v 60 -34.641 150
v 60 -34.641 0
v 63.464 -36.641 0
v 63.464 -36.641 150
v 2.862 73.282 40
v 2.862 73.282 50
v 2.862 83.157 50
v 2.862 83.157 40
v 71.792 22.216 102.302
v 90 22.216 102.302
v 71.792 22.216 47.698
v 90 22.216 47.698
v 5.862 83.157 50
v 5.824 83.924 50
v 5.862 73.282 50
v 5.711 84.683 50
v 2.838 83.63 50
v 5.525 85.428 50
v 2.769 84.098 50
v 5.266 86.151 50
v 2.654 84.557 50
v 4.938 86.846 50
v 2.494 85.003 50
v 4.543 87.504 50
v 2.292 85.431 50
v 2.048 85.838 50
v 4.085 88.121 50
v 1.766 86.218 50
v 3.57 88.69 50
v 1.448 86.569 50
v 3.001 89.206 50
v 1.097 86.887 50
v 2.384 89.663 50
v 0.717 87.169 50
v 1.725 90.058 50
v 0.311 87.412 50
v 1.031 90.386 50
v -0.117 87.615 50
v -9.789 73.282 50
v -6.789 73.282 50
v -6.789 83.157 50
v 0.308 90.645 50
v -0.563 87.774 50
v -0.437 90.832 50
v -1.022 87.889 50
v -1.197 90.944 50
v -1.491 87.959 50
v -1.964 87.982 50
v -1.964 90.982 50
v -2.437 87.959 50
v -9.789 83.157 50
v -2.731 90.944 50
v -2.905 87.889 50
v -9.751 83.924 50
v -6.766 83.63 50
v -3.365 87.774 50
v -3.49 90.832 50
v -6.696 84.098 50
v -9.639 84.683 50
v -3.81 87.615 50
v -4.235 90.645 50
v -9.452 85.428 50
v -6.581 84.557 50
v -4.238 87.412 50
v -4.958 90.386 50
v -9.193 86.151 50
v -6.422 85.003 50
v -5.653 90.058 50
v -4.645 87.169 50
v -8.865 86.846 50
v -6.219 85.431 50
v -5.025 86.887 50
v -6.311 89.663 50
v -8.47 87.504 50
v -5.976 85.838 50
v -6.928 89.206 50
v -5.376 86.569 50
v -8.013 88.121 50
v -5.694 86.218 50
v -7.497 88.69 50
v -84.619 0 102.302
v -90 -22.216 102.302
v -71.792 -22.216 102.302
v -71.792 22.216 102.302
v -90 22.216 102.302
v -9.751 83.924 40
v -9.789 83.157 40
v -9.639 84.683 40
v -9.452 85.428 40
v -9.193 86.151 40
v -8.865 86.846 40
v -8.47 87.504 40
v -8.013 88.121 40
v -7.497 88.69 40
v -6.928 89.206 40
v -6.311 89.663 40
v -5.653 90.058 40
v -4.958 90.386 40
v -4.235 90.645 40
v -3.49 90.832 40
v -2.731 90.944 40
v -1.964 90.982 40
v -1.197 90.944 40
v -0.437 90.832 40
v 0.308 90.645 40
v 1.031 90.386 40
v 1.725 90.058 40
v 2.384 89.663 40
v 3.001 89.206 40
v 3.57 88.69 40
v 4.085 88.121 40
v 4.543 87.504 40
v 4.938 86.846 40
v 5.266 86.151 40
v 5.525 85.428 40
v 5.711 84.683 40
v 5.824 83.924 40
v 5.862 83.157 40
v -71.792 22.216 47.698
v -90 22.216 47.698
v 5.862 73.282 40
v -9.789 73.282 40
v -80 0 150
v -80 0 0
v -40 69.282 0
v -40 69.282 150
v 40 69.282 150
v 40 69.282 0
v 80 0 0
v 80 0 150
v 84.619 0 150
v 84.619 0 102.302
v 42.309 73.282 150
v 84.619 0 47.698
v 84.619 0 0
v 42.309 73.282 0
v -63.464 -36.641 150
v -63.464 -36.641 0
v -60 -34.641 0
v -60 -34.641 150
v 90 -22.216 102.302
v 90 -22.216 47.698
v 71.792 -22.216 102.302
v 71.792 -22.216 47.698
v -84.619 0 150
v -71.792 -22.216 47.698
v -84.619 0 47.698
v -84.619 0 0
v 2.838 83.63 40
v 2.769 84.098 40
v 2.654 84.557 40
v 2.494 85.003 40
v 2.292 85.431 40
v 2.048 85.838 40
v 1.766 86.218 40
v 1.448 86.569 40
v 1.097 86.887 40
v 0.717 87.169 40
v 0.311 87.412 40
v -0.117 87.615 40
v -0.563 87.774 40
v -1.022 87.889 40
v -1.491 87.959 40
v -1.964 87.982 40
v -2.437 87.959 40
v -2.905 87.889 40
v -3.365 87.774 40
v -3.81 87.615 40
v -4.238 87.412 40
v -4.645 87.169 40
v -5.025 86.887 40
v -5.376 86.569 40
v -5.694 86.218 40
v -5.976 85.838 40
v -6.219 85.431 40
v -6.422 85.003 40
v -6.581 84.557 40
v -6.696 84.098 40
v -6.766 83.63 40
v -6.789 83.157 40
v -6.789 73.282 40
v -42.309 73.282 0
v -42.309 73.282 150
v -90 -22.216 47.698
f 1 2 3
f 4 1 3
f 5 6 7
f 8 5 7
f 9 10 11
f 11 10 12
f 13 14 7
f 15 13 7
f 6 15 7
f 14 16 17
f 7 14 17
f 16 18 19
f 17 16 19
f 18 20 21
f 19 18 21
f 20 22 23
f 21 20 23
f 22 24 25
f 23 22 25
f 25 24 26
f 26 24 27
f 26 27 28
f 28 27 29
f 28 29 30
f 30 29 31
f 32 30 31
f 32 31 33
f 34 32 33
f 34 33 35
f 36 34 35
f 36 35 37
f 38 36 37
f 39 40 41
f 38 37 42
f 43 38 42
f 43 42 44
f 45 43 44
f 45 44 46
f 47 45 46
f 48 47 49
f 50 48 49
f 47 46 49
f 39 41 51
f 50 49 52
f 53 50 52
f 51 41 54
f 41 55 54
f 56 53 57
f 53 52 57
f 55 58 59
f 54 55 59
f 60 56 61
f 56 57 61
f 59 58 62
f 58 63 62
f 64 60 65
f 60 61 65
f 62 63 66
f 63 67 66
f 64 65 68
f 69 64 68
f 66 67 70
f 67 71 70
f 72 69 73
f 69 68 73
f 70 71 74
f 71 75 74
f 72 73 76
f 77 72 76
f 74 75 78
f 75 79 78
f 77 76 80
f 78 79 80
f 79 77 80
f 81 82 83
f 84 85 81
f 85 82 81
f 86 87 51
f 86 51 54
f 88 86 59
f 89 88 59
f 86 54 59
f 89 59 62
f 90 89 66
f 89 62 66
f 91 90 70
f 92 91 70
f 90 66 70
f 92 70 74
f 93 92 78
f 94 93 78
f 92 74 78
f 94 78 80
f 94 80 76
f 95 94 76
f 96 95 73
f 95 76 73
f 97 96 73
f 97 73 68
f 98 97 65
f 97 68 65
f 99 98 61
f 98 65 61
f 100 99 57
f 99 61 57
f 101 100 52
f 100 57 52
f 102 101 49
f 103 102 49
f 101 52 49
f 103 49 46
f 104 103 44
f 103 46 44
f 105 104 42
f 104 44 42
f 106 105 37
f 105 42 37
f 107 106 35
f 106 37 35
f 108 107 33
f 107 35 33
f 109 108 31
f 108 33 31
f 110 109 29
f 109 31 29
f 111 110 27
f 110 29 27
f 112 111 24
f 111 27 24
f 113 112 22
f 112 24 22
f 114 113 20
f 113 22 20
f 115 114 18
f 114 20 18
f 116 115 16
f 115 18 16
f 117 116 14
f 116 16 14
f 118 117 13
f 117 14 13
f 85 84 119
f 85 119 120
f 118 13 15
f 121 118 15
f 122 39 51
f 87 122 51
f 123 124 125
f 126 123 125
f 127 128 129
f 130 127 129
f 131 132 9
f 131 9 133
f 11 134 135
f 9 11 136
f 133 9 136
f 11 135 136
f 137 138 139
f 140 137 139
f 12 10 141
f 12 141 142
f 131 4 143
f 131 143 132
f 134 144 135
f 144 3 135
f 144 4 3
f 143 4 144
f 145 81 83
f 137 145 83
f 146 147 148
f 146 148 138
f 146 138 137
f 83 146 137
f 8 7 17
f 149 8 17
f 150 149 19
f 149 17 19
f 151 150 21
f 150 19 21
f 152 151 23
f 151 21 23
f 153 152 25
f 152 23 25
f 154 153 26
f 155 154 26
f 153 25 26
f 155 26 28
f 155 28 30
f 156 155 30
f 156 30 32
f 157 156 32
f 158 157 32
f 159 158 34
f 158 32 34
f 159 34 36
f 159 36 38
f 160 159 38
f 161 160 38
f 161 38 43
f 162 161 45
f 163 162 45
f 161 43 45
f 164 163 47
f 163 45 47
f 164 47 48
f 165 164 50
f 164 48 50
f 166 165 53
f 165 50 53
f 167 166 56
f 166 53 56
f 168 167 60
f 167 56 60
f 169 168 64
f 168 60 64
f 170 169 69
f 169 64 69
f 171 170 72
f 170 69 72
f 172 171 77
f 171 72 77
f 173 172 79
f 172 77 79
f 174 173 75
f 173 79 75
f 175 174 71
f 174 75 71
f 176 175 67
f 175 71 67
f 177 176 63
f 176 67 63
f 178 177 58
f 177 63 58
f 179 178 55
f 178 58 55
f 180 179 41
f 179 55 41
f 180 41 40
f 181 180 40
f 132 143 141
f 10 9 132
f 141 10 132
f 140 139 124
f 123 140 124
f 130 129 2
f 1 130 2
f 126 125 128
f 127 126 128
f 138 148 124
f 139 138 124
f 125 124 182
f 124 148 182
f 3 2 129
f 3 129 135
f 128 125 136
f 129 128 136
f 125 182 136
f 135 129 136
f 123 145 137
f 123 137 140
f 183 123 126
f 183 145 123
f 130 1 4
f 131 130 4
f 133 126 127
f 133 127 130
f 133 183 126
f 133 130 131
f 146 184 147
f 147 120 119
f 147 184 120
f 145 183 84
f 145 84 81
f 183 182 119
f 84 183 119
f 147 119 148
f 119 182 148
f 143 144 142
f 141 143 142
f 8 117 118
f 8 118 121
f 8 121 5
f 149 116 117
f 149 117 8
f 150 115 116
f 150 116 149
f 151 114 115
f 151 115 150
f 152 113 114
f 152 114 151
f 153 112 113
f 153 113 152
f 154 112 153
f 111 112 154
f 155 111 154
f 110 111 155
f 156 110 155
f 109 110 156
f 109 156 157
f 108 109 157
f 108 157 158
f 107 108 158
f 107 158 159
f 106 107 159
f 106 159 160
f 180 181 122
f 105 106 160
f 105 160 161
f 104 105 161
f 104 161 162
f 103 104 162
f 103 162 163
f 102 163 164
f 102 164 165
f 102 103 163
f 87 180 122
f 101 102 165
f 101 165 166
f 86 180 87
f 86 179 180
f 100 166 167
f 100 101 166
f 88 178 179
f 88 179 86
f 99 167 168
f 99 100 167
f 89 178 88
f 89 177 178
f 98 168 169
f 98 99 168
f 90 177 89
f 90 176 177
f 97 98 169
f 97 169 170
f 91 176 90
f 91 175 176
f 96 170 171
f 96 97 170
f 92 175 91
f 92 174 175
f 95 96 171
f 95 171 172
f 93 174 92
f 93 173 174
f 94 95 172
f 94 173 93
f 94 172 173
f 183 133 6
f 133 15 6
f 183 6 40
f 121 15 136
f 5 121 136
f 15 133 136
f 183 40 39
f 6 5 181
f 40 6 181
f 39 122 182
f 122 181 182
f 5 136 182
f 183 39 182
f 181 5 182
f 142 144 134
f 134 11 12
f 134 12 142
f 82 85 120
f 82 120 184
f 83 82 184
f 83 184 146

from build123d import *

# Parameters (mm, degrees)
BOSS_EXTRUDE1_DEPTH = 150
BOSS_EXTRUDE2_REACH = 243.582
SKETCH2_W           = 54.603647952
SKETCH2_H           = 44.432380196
BOSS_EXTRUDE3_REACH = 243.582
SKETCH2_3_W         = 54.603647952
SKETCH2_3_H         = 44.432380196
MIRROR1_START       = 47.698176024
MIRROR1_DEPTH       = 54.603647952
CUT_EXTRUDE1_DEPTH  = 194.302477267
CUT_EXTRUDE2_DEPTH  = 54.603647952
BOSS_EXTRUDE4_START = -100
BOSS_EXTRUDE4_DEPTH = 10


# Read off the part's stored shape, not the designer's step: Mirror1
with BuildPart() as part:
    # Sketch1 → Boss-Extrude1 (new body)
    with BuildSketch(Plane.XY):
        Polygon((-42.309401077, 73.282032303), (-84.618802154, 0), (-63.464101615, -36.641016151), (-60, -34.641016151), (-80, 0), (-40, 69.282032303), (40, 69.282032303), (80, 0), (60, -34.641016151), (63.464101615, -36.641016151), (84.618802154, 0), (42.309401077, 73.282032303), align=None)
    extrude(amount=BOSS_EXTRUDE1_DEPTH)

    # Boss-Extrude2: up to this face of the body (flat: up to its plane)
    boss_extrude2_end = Plane(part.part.faces().sort_by_distance((74.041451884, -18.320508076, 75))[0])
    # Sketch2 → Boss-Extrude2 (add, up to the picked face)
    with BuildSketch(Plane(origin=(90, 0, 0), x_dir=(0, 0, -1), z_dir=(1, 0, 0)), mode=Mode.PRIVATE) as boss_extrude2_sk1:
        with Locations((-75, 0)):
            Rectangle(SKETCH2_W, SKETCH2_H)
    boss_extrude2_tool1 = split(extrude(boss_extrude2_sk1.sketch, amount=-BOSS_EXTRUDE2_REACH, mode=Mode.PRIVATE), bisect_by=boss_extrude2_end, keep=Keep.BOTH, mode=Mode.PRIVATE)
    add(boss_extrude2_tool1.solids().sort_by(Axis((90, 0, 75), (-1, 0, 0)))[0])

    # Boss-Extrude3: up to this face of the body (flat: up to its plane)
    boss_extrude3_end = Plane(part.part.faces().sort_by_distance((63.464101615, 36.641016151, 75))[0])
    # Sketch2<3> → Boss-Extrude3 (add, up to the picked face)
    with BuildSketch(Plane(origin=(90, 0, 0), x_dir=(0, 0, -1), z_dir=(1, 0, 0)), mode=Mode.PRIVATE) as boss_extrude3_sk1:
        with Locations((-75, 0)):
            Rectangle(SKETCH2_3_W, SKETCH2_3_H)
    boss_extrude3_tool1 = split(extrude(boss_extrude3_sk1.sketch, amount=-BOSS_EXTRUDE3_REACH, mode=Mode.PRIVATE), bisect_by=boss_extrude3_end, keep=Keep.BOTH, mode=Mode.PRIVATE)
    add(boss_extrude3_tool1.solids().sort_by(Axis((90, 0, 75), (-1, 0, 0)))[0])

    # Mirror1 outline → Mirror1 (add)
    with BuildSketch(Plane.XY.offset(MIRROR1_START)):
        Polygon((97.445325487, -22.216190098), (90, -9.320508076), (90, -22.216190098), align=None)
        Polygon((-67.173476666, -22.216190098), (67.173476666, -22.216190098), (80, 0), (67.173476666, 22.216190098), (-67.173476666, 22.216190098), (-80, 0), align=None)
        Polygon((-90, -22.216190098), (-71.79227882, -22.216190098), (-84.618802154, 0), (-71.79227882, 22.216190098), (-90, 22.216190098), align=None)
    extrude(amount=MIRROR1_DEPTH)

    # Sketch3 → Cut-Extrude1 (cut, through all)
    with BuildSketch(Plane.XY.offset(150)):
        Polygon((80, 0), (60, -34.641016151), (-60, -34.641016151), (-80, 0), (-40, 69.282032303), (40, 69.282032303), align=None)
    extrude(amount=-CUT_EXTRUDE1_DEPTH, mode=Mode.SUBTRACT)

    # Sketch4 → Cut-Extrude2 (cut)
    with BuildSketch(Plane.XY.offset(102.301823976)):
        Polygon((90, -9.320508076), (90, -22.216190098), (97.445325487, -22.216190098), align=None)
    extrude(amount=-CUT_EXTRUDE2_DEPTH, mode=Mode.SUBTRACT)

    # Sketch5 → Boss-Extrude4 (add)
    with BuildSketch(Plane.XY.offset(150).offset(BOSS_EXTRUDE4_START)):
        with BuildLine():
            Line((-9.78911305, 73.282032303), (-9.78911305, 83.156762189))
            ThreePointArc((-9.78911305, 83.156762189), (-1.963791345, 90.982083893), (5.861530359, 83.156762189))
            Line((5.861530359, 83.156762189), (5.861530359, 73.282032303))
            Line((5.861530359, 73.282032303), (2.861530359, 73.282032303))
            Line((2.861530359, 73.282032303), (2.861530359, 83.156762189))
            ThreePointArc((2.861530359, 83.156762189), (-1.963791345, 87.982083893), (-6.78911305, 83.156762189))
            Line((-6.78911305, 83.156762189), (-6.78911305, 73.282032303))
            Line((-6.78911305, 73.282032303), (-9.78911305, 73.282032303))
        make_face()
    extrude(amount=-BOSS_EXTRUDE4_DEPTH)


solid = part.part
